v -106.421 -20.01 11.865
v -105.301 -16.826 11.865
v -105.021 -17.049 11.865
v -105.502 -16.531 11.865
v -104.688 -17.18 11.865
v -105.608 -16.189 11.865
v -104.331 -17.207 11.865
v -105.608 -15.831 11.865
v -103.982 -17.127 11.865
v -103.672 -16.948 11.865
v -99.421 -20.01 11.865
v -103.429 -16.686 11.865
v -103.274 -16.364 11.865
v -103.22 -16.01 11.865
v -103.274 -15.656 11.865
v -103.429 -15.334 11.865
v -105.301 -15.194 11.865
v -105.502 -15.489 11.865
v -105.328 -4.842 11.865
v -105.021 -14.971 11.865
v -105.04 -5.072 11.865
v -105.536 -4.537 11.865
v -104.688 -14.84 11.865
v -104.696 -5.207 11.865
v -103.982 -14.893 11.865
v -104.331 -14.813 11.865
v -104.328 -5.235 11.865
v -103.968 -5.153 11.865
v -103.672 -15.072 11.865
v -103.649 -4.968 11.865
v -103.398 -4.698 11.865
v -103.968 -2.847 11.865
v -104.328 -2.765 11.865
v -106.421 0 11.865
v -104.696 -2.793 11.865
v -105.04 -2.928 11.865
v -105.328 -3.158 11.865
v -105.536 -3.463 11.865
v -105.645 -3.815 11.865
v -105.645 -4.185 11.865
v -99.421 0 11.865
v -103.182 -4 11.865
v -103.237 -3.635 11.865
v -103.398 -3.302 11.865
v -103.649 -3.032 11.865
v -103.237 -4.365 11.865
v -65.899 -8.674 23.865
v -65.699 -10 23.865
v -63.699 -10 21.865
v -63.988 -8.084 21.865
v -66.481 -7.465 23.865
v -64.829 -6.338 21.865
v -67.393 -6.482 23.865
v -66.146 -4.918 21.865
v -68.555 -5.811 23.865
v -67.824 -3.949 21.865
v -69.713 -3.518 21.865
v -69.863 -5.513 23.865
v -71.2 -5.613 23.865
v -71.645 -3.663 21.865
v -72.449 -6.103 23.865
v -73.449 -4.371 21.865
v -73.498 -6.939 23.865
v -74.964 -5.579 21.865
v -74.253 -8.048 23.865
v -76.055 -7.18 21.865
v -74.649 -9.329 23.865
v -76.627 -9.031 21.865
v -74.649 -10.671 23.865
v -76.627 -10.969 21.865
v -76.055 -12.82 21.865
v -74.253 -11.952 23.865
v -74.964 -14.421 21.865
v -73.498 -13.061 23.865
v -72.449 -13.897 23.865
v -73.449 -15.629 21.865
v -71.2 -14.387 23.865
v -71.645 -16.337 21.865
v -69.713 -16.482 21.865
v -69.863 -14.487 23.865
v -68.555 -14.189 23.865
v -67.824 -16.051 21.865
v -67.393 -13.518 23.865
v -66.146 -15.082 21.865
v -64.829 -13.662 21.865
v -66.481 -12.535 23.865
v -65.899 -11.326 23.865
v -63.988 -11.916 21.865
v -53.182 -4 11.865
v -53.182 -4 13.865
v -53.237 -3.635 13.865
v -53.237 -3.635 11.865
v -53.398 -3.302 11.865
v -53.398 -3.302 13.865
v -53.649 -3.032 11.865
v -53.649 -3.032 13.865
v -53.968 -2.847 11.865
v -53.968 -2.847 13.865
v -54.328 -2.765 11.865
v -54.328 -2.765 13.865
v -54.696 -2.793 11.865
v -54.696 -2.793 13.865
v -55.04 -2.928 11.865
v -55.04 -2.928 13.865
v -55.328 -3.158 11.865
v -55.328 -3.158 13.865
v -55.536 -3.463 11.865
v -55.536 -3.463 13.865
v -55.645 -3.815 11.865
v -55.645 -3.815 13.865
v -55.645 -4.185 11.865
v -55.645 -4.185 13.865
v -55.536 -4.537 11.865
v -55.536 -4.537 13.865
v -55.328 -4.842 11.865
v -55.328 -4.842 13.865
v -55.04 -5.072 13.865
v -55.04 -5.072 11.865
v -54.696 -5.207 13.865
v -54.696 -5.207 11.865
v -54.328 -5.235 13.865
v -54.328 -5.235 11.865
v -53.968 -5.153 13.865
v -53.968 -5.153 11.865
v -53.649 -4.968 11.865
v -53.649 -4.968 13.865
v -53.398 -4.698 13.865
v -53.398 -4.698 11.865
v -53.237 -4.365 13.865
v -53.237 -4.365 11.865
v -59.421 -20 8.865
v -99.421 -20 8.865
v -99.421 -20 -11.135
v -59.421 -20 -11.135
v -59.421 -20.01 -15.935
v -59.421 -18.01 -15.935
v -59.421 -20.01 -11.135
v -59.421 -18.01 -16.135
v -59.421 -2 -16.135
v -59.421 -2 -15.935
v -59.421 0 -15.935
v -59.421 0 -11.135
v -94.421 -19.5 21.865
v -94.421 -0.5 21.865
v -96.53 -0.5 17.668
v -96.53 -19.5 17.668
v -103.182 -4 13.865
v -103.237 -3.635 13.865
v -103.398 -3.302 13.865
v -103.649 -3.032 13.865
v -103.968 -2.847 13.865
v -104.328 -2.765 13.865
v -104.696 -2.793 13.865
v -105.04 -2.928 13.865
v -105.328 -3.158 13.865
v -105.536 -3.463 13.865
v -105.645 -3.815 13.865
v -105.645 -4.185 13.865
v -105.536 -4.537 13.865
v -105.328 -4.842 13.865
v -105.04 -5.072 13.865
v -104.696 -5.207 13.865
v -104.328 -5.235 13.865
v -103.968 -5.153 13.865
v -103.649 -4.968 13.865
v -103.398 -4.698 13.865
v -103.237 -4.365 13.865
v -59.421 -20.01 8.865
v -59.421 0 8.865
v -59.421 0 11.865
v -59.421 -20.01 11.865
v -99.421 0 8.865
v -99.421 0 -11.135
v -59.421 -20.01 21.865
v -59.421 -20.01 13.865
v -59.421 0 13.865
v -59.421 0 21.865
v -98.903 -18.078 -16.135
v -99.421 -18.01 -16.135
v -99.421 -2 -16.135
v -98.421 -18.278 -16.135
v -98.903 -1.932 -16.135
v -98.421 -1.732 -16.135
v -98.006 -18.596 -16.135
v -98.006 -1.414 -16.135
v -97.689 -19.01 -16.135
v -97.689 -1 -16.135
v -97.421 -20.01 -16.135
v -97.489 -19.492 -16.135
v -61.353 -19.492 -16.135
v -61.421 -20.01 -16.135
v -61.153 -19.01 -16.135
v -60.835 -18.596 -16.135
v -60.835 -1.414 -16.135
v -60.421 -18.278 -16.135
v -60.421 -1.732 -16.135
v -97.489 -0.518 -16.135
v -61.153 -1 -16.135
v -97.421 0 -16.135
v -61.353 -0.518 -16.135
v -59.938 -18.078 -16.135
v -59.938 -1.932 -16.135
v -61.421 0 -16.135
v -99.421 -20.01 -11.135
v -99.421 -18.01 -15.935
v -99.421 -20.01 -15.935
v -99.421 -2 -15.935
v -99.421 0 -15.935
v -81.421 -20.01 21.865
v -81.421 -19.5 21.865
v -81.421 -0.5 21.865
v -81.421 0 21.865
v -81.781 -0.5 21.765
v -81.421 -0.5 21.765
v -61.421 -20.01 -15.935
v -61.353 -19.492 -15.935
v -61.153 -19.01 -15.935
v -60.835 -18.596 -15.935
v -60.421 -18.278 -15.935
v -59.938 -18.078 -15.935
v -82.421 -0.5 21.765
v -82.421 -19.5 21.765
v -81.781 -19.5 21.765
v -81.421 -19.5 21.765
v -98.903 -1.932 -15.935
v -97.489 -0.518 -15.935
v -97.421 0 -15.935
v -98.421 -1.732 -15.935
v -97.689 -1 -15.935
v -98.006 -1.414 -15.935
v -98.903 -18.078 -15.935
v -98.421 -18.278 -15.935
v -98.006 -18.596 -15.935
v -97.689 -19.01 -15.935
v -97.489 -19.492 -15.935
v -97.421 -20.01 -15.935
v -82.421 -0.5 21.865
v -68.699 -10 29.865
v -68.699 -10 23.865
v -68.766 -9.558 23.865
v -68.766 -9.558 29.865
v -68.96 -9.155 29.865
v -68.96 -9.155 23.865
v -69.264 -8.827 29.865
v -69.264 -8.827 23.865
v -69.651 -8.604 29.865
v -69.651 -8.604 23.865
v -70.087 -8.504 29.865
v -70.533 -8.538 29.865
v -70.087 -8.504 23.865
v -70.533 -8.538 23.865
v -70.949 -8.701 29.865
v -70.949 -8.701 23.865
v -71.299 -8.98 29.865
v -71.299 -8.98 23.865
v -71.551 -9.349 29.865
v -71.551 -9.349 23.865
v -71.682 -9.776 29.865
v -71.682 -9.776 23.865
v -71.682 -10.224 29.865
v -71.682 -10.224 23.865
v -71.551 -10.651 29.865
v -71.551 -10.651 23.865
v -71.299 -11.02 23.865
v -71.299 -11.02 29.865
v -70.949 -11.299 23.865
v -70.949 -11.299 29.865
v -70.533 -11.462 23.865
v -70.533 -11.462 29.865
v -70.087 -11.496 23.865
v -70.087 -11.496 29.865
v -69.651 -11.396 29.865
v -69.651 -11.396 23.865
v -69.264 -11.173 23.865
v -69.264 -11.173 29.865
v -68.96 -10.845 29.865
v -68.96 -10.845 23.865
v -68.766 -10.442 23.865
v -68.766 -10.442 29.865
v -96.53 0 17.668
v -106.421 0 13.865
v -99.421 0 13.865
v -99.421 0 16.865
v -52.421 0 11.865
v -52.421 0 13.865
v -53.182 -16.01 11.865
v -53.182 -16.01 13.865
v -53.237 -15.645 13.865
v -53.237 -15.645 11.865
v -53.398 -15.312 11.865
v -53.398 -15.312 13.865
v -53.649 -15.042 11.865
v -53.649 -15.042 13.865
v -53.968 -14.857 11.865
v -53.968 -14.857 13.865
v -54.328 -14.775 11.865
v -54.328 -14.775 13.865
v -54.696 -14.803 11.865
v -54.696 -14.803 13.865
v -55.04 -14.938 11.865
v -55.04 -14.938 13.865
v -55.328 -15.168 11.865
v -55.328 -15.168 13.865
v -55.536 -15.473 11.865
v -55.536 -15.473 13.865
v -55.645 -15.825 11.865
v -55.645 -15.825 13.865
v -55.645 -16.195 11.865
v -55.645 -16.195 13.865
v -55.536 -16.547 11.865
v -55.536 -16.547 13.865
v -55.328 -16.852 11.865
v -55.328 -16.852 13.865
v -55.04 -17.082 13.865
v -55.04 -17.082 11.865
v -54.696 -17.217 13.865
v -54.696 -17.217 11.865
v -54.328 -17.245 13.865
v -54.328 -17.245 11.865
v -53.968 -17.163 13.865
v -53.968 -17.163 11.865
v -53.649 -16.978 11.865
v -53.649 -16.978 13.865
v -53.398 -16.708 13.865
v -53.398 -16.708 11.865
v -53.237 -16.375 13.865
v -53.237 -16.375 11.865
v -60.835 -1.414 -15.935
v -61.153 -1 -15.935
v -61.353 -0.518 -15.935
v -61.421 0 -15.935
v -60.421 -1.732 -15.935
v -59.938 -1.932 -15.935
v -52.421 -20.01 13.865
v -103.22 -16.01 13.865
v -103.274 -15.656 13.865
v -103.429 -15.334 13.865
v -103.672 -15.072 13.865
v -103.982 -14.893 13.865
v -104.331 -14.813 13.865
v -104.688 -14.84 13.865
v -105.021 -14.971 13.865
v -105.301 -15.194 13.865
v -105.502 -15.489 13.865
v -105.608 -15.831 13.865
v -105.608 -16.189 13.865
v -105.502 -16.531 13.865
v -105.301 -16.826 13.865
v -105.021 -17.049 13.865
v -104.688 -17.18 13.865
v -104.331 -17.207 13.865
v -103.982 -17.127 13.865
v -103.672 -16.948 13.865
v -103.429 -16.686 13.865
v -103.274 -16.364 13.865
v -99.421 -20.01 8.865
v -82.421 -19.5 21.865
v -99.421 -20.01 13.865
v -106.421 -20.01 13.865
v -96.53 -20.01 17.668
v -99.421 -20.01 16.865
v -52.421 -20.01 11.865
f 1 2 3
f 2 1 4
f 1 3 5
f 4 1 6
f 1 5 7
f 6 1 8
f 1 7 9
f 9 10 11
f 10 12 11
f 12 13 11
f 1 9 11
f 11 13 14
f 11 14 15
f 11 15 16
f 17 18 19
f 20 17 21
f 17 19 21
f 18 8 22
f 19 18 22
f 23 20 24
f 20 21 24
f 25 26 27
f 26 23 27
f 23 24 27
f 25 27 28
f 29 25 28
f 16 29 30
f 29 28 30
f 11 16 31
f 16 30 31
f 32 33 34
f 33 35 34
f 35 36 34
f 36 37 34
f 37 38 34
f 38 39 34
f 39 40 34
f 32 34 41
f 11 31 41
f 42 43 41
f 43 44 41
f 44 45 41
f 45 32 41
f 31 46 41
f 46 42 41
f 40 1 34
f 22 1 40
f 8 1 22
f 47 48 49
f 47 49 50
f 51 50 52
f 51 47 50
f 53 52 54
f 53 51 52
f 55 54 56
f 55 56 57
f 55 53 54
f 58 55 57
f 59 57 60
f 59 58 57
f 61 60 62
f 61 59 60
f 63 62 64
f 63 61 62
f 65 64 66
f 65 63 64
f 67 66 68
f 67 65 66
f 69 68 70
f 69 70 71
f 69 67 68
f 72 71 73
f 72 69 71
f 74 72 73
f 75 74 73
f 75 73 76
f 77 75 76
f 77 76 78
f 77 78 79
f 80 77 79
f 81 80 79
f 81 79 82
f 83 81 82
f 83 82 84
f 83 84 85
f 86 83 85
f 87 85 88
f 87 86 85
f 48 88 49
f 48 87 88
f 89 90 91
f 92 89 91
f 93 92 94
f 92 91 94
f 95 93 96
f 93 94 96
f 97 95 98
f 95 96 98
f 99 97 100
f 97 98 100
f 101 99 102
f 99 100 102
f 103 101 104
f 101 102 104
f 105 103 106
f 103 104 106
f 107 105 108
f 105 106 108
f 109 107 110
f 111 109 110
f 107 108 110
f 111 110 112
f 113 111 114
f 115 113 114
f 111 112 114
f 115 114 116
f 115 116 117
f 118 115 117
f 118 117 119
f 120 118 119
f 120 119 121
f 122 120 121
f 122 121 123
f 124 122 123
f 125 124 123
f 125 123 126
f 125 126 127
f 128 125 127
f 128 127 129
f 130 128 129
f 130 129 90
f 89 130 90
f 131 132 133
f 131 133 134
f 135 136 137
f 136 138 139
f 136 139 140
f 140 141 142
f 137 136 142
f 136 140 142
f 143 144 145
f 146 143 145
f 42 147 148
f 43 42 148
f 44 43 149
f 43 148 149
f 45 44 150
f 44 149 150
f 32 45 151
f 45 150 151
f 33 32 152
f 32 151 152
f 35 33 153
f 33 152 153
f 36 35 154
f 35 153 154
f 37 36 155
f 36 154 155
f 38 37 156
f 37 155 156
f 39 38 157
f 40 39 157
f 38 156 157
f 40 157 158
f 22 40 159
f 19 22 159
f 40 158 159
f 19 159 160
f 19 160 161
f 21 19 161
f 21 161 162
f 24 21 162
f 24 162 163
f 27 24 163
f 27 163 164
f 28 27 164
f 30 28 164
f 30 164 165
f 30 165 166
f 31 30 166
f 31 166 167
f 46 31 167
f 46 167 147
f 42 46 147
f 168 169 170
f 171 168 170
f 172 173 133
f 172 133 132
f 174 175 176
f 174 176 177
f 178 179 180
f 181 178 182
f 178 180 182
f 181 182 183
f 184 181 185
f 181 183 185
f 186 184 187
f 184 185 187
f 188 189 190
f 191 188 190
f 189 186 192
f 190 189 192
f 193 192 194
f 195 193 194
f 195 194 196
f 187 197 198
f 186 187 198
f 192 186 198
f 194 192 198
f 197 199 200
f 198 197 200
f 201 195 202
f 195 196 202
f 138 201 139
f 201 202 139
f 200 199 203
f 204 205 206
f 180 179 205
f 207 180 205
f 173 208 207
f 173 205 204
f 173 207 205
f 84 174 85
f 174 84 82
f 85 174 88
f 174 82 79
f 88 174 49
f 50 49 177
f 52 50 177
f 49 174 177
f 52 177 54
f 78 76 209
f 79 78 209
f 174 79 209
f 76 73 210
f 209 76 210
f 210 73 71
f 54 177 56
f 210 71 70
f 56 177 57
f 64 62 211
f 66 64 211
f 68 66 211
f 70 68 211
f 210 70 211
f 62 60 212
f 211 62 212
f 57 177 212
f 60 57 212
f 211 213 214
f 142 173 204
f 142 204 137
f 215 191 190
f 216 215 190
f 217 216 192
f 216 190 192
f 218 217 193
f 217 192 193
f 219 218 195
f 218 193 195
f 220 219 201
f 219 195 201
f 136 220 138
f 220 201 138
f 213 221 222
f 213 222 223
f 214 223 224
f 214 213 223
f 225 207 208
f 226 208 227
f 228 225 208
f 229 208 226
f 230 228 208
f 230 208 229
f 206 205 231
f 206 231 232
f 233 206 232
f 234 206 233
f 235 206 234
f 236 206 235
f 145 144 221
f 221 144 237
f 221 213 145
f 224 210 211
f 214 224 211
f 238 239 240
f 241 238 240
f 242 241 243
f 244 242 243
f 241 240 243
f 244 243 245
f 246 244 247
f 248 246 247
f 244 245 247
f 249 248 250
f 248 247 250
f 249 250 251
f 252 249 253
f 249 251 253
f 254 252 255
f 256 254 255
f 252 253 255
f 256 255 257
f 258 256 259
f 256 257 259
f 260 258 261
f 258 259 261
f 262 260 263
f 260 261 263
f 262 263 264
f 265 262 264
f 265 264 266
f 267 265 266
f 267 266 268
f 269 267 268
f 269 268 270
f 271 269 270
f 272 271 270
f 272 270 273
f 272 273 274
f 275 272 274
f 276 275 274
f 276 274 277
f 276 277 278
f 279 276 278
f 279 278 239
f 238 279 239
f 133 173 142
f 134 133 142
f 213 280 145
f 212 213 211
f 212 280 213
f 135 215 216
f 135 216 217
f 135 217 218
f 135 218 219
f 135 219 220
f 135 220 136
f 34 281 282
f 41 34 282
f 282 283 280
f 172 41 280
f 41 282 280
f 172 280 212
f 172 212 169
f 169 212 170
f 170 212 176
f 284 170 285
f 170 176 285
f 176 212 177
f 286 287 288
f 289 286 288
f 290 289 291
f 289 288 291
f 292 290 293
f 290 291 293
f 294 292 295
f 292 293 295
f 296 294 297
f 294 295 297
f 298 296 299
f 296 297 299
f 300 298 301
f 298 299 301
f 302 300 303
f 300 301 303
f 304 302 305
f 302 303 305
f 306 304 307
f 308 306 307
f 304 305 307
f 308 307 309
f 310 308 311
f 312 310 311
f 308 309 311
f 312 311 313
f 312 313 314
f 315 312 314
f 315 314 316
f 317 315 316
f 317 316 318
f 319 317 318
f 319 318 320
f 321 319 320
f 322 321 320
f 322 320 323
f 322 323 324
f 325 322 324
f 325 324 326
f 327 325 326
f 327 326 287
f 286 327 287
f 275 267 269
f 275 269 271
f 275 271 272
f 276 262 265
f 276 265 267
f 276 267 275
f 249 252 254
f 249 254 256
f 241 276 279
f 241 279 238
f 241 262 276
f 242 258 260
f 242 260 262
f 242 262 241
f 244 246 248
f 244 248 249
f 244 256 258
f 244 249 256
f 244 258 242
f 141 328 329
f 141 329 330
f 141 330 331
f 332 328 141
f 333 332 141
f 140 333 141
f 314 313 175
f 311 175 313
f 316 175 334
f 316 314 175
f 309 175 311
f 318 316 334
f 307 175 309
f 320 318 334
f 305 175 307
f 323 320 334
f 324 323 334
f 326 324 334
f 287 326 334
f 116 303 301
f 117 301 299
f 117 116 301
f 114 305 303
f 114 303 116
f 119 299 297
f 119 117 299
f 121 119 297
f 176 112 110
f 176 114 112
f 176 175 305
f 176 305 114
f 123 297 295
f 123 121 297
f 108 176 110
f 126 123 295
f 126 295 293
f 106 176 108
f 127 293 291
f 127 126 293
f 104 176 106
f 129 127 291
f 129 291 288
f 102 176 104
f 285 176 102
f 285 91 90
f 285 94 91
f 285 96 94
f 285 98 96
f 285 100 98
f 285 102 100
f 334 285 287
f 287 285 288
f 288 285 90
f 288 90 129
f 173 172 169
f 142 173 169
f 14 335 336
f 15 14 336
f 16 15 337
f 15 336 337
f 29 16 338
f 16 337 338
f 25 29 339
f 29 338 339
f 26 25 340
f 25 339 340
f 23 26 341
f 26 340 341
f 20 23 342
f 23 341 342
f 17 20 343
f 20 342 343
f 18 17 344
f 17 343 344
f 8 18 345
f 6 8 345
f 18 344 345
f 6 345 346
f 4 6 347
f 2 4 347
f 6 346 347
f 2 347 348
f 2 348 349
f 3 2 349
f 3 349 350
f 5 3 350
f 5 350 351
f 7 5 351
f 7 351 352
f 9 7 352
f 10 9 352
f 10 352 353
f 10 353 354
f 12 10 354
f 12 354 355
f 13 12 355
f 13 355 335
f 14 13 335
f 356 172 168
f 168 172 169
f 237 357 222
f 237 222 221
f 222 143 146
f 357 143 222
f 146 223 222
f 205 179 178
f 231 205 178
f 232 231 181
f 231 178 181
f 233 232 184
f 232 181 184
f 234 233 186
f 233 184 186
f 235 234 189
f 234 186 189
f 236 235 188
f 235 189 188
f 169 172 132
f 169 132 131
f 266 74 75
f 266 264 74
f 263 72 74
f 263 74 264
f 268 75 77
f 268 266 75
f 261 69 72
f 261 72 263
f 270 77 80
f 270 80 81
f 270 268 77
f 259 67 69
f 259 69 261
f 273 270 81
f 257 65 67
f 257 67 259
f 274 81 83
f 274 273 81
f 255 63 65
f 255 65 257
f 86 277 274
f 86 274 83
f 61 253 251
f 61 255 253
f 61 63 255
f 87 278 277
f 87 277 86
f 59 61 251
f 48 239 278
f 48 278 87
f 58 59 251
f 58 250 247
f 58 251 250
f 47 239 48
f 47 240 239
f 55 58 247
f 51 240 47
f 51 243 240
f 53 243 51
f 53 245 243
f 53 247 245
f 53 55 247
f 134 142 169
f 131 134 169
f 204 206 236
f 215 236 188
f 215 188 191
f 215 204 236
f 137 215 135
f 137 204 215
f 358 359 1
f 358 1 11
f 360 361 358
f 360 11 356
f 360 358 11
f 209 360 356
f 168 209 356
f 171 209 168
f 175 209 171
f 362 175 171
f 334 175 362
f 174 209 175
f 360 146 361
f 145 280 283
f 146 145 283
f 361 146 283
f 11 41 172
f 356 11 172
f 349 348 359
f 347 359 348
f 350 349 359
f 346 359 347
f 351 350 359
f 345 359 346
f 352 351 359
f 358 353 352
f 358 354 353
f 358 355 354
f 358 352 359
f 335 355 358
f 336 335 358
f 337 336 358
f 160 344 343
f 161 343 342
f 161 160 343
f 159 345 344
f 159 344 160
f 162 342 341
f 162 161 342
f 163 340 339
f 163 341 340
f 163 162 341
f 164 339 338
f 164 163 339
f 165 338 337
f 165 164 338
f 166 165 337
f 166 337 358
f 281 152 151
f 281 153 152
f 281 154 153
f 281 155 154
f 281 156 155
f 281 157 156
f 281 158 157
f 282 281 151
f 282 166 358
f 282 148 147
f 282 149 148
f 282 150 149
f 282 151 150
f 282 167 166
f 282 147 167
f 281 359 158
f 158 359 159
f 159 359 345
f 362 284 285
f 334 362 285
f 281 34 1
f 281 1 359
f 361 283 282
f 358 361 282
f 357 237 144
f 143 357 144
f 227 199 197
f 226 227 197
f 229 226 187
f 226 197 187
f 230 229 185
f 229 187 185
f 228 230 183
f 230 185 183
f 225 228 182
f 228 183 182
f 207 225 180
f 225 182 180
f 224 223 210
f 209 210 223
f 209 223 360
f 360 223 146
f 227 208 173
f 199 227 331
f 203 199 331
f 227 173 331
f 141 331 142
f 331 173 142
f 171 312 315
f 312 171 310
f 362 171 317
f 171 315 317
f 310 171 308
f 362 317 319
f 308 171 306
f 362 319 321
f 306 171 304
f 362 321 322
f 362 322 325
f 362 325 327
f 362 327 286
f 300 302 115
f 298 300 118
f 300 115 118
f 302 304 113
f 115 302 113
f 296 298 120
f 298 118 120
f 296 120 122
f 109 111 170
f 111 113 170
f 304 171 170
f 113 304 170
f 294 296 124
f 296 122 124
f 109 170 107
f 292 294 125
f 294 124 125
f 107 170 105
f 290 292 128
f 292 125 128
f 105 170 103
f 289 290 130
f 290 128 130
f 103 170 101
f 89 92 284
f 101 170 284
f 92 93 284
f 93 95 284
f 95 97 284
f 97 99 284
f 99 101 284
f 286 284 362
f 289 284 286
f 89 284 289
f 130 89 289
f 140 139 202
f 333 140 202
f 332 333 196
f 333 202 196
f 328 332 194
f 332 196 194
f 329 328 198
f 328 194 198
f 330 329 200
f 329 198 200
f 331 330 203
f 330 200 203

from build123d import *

# Parameters (mm, degrees)
F0_W      = 7
F0_H      = 2
F1_DEPTH  = 20.01
F0_W_2    = 40
F0_H_2    = 5
F0_H_3    = 20
F2_DEPTH  = 20
F3_R      = 1.2382162301
F3_R_2    = 1.2382178276
F3_R_3    = 1.2002117001
F3_R_4    = 1.2382157204
F4_DEPTH  = 5
F5_DEPTH  = 19.5
F6_DEPTH  = 0.5
F7_W      = 1
F7_H      = 19
F8_DEPTH  = 0.1
F7_R      = 1.5
F9_DEPTH  = 8
F7_R_2    = 6.5
F10_DEPTH = 2
F11_SIZE  = 1.99999
F13_DEPTH = 0.2


# Not quite as in the source:
# - a fillet or chamfer is up to 0.001 mm smaller than in the source, because OpenCascade refuses the exact size


with BuildPart() as f1:
    # F0 (on Front) → F1 (new body)
    with BuildSketch(Plane.XZ):
        Polygon((-99.4207011163, 11.8651846424), (-99.4207011163, 8.8651846424), (-59.4207011163, 8.8651846424), (-59.4207011163, 11.8651846424), (-59.4207011163, 13.8651846424), (-59.4207011163, 21.8651846424), (-81.4207011163, 21.8651846424), (-96.5301473874, 17.6681162337), (-99.4207011163, 16.8651846424), (-99.4207011163, 13.8651846424), align=None)
        with Locations((-102.9207011163, 12.8651846424)):
            Rectangle(F0_W, F0_H)
        with Locations((-55.9207011163, 12.8651846424)):
            Rectangle(F0_W, F0_H)
    extrude(amount=F1_DEPTH)

    # F3 (on face) → F4 (cut)
    with BuildSketch(Plane.XY.offset(13.8651846424)):
        with Locations((-54.4207011163, -4)):
            Circle(F3_R)
        with Locations((-54.4207011163, -16.01)):
            Circle(F3_R_2)
        with Locations((-104.4207011163, -16.01)):
            Circle(F3_R_3)
        with Locations((-104.4207011163, -4)):
            Circle(F3_R_4)
    extrude(amount=-F4_DEPTH, mode=Mode.SUBTRACT)

    # F0 (on Front) → F5 (join)
    with BuildSketch(Plane.XZ):
        Polygon((-94.4207011163, 21.8651846424), (-96.5301473874, 17.6681162337), (-81.4207011163, 21.8651846424), align=None)
    extrude(amount=F5_DEPTH)

    # F0 (on Front) → F6 (cut)
    with BuildSketch(Plane.XZ):
        Polygon((-94.4207011163, 21.8651846424), (-96.5301473874, 17.6681162337), (-81.4207011163, 21.8651846424), align=None)
    extrude(amount=F6_DEPTH, mode=Mode.SUBTRACT)

    # F7 (on face) → F8 (cut)
    with BuildSketch(Plane.XY.offset(21.8651846424)):
        with Locations((-81.9207011163, -10)):
            Rectangle(F7_W, F7_H)
    extrude(amount=-F8_DEPTH, mode=Mode.SUBTRACT)

    # F7 (on face) → F9 (join)
    with BuildSketch(Plane.XY.offset(21.8651846424)):
        with Locations((-70.1991021633, -10)):
            Circle(F7_R)
    extrude(amount=F9_DEPTH)

    # F7 (on face) → F10 (join)
    with BuildSketch(Plane.XY.offset(21.8651846424)):
        with Locations((-70.1991021633, -10)):
            Circle(F7_R_2)
        with Locations((-70.1991021633, -10)):
            Circle(F7_R, mode=Mode.SUBTRACT)
    extrude(amount=F10_DEPTH)

    # F11 (size 2 in the source; OpenCascade refuses exactly that, so slightly less here)
    f11_edges = [f1.edges().sort_by_distance(p)[0] for p in [
        (-76.699102, -10, 23.865185),
    ]]
    chamfer(f11_edges, length=F11_SIZE)


with BuildPart() as f1b:
    # F0 (on Front) → F1, piece 2 (new body)
    with BuildSketch(Plane.XZ):
        with Locations((-79.4207011163, -13.6348153576)):
            Rectangle(F0_W_2, F0_H_2)
    extrude(amount=F1_DEPTH)

    # F12 (on face) → F13 (cut)
    with BuildSketch(Plane(origin=(0, 0, -16.1348153576), x_dir=(1, 0, 0), z_dir=(0, 0, -1))):
        with BuildLine():
            Line((-59.4207011163, 0), (-59.4207011163, 2))
            ThreePointArc((-59.4207011163, 2), (-60.8349146787, 1.4142135624), (-61.4207011163, 0))
            Line((-61.4207011163, 0), (-59.4207011163, 0))
        make_face()
        with BuildLine():
            ThreePointArc((-61.4207011163, 20.01), (-60.8349146787, 18.5957864376), (-59.4207011163, 18.01))
            Line((-59.4207011163, 18.01), (-59.4207011163, 20.01))
            Line((-59.4207011163, 20.01), (-61.4207011163, 20.01))
        make_face()
        with BuildLine():
            ThreePointArc((-99.4207011163, 18.01), (-98.006487554, 18.5957864376), (-97.4207011163, 20.01))
            Line((-97.4207011163, 20.01), (-99.4207011163, 20.01))
            Line((-99.4207011163, 20.01), (-99.4207011163, 18.01))
        make_face()
        with BuildLine():
            Line((-99.4207011163, 0), (-97.4207011163, 0))
            ThreePointArc((-97.4207011163, 0), (-98.006487554, 1.4142135624), (-99.4207011163, 2))
            Line((-99.4207011163, 2), (-99.4207011163, 0))
        make_face()
    extrude(amount=-F13_DEPTH, mode=Mode.SUBTRACT)


with BuildPart() as f2:
    # F0 (on Front) → F2 (new body)
    with BuildSketch(Plane.XZ):
        with Locations((-79.4207011163, -1.1348153576)):
            Rectangle(F0_W_2, F0_H_3)
    extrude(amount=F2_DEPTH)


solid = Compound([f1.part, f1b.part, f2.part])
